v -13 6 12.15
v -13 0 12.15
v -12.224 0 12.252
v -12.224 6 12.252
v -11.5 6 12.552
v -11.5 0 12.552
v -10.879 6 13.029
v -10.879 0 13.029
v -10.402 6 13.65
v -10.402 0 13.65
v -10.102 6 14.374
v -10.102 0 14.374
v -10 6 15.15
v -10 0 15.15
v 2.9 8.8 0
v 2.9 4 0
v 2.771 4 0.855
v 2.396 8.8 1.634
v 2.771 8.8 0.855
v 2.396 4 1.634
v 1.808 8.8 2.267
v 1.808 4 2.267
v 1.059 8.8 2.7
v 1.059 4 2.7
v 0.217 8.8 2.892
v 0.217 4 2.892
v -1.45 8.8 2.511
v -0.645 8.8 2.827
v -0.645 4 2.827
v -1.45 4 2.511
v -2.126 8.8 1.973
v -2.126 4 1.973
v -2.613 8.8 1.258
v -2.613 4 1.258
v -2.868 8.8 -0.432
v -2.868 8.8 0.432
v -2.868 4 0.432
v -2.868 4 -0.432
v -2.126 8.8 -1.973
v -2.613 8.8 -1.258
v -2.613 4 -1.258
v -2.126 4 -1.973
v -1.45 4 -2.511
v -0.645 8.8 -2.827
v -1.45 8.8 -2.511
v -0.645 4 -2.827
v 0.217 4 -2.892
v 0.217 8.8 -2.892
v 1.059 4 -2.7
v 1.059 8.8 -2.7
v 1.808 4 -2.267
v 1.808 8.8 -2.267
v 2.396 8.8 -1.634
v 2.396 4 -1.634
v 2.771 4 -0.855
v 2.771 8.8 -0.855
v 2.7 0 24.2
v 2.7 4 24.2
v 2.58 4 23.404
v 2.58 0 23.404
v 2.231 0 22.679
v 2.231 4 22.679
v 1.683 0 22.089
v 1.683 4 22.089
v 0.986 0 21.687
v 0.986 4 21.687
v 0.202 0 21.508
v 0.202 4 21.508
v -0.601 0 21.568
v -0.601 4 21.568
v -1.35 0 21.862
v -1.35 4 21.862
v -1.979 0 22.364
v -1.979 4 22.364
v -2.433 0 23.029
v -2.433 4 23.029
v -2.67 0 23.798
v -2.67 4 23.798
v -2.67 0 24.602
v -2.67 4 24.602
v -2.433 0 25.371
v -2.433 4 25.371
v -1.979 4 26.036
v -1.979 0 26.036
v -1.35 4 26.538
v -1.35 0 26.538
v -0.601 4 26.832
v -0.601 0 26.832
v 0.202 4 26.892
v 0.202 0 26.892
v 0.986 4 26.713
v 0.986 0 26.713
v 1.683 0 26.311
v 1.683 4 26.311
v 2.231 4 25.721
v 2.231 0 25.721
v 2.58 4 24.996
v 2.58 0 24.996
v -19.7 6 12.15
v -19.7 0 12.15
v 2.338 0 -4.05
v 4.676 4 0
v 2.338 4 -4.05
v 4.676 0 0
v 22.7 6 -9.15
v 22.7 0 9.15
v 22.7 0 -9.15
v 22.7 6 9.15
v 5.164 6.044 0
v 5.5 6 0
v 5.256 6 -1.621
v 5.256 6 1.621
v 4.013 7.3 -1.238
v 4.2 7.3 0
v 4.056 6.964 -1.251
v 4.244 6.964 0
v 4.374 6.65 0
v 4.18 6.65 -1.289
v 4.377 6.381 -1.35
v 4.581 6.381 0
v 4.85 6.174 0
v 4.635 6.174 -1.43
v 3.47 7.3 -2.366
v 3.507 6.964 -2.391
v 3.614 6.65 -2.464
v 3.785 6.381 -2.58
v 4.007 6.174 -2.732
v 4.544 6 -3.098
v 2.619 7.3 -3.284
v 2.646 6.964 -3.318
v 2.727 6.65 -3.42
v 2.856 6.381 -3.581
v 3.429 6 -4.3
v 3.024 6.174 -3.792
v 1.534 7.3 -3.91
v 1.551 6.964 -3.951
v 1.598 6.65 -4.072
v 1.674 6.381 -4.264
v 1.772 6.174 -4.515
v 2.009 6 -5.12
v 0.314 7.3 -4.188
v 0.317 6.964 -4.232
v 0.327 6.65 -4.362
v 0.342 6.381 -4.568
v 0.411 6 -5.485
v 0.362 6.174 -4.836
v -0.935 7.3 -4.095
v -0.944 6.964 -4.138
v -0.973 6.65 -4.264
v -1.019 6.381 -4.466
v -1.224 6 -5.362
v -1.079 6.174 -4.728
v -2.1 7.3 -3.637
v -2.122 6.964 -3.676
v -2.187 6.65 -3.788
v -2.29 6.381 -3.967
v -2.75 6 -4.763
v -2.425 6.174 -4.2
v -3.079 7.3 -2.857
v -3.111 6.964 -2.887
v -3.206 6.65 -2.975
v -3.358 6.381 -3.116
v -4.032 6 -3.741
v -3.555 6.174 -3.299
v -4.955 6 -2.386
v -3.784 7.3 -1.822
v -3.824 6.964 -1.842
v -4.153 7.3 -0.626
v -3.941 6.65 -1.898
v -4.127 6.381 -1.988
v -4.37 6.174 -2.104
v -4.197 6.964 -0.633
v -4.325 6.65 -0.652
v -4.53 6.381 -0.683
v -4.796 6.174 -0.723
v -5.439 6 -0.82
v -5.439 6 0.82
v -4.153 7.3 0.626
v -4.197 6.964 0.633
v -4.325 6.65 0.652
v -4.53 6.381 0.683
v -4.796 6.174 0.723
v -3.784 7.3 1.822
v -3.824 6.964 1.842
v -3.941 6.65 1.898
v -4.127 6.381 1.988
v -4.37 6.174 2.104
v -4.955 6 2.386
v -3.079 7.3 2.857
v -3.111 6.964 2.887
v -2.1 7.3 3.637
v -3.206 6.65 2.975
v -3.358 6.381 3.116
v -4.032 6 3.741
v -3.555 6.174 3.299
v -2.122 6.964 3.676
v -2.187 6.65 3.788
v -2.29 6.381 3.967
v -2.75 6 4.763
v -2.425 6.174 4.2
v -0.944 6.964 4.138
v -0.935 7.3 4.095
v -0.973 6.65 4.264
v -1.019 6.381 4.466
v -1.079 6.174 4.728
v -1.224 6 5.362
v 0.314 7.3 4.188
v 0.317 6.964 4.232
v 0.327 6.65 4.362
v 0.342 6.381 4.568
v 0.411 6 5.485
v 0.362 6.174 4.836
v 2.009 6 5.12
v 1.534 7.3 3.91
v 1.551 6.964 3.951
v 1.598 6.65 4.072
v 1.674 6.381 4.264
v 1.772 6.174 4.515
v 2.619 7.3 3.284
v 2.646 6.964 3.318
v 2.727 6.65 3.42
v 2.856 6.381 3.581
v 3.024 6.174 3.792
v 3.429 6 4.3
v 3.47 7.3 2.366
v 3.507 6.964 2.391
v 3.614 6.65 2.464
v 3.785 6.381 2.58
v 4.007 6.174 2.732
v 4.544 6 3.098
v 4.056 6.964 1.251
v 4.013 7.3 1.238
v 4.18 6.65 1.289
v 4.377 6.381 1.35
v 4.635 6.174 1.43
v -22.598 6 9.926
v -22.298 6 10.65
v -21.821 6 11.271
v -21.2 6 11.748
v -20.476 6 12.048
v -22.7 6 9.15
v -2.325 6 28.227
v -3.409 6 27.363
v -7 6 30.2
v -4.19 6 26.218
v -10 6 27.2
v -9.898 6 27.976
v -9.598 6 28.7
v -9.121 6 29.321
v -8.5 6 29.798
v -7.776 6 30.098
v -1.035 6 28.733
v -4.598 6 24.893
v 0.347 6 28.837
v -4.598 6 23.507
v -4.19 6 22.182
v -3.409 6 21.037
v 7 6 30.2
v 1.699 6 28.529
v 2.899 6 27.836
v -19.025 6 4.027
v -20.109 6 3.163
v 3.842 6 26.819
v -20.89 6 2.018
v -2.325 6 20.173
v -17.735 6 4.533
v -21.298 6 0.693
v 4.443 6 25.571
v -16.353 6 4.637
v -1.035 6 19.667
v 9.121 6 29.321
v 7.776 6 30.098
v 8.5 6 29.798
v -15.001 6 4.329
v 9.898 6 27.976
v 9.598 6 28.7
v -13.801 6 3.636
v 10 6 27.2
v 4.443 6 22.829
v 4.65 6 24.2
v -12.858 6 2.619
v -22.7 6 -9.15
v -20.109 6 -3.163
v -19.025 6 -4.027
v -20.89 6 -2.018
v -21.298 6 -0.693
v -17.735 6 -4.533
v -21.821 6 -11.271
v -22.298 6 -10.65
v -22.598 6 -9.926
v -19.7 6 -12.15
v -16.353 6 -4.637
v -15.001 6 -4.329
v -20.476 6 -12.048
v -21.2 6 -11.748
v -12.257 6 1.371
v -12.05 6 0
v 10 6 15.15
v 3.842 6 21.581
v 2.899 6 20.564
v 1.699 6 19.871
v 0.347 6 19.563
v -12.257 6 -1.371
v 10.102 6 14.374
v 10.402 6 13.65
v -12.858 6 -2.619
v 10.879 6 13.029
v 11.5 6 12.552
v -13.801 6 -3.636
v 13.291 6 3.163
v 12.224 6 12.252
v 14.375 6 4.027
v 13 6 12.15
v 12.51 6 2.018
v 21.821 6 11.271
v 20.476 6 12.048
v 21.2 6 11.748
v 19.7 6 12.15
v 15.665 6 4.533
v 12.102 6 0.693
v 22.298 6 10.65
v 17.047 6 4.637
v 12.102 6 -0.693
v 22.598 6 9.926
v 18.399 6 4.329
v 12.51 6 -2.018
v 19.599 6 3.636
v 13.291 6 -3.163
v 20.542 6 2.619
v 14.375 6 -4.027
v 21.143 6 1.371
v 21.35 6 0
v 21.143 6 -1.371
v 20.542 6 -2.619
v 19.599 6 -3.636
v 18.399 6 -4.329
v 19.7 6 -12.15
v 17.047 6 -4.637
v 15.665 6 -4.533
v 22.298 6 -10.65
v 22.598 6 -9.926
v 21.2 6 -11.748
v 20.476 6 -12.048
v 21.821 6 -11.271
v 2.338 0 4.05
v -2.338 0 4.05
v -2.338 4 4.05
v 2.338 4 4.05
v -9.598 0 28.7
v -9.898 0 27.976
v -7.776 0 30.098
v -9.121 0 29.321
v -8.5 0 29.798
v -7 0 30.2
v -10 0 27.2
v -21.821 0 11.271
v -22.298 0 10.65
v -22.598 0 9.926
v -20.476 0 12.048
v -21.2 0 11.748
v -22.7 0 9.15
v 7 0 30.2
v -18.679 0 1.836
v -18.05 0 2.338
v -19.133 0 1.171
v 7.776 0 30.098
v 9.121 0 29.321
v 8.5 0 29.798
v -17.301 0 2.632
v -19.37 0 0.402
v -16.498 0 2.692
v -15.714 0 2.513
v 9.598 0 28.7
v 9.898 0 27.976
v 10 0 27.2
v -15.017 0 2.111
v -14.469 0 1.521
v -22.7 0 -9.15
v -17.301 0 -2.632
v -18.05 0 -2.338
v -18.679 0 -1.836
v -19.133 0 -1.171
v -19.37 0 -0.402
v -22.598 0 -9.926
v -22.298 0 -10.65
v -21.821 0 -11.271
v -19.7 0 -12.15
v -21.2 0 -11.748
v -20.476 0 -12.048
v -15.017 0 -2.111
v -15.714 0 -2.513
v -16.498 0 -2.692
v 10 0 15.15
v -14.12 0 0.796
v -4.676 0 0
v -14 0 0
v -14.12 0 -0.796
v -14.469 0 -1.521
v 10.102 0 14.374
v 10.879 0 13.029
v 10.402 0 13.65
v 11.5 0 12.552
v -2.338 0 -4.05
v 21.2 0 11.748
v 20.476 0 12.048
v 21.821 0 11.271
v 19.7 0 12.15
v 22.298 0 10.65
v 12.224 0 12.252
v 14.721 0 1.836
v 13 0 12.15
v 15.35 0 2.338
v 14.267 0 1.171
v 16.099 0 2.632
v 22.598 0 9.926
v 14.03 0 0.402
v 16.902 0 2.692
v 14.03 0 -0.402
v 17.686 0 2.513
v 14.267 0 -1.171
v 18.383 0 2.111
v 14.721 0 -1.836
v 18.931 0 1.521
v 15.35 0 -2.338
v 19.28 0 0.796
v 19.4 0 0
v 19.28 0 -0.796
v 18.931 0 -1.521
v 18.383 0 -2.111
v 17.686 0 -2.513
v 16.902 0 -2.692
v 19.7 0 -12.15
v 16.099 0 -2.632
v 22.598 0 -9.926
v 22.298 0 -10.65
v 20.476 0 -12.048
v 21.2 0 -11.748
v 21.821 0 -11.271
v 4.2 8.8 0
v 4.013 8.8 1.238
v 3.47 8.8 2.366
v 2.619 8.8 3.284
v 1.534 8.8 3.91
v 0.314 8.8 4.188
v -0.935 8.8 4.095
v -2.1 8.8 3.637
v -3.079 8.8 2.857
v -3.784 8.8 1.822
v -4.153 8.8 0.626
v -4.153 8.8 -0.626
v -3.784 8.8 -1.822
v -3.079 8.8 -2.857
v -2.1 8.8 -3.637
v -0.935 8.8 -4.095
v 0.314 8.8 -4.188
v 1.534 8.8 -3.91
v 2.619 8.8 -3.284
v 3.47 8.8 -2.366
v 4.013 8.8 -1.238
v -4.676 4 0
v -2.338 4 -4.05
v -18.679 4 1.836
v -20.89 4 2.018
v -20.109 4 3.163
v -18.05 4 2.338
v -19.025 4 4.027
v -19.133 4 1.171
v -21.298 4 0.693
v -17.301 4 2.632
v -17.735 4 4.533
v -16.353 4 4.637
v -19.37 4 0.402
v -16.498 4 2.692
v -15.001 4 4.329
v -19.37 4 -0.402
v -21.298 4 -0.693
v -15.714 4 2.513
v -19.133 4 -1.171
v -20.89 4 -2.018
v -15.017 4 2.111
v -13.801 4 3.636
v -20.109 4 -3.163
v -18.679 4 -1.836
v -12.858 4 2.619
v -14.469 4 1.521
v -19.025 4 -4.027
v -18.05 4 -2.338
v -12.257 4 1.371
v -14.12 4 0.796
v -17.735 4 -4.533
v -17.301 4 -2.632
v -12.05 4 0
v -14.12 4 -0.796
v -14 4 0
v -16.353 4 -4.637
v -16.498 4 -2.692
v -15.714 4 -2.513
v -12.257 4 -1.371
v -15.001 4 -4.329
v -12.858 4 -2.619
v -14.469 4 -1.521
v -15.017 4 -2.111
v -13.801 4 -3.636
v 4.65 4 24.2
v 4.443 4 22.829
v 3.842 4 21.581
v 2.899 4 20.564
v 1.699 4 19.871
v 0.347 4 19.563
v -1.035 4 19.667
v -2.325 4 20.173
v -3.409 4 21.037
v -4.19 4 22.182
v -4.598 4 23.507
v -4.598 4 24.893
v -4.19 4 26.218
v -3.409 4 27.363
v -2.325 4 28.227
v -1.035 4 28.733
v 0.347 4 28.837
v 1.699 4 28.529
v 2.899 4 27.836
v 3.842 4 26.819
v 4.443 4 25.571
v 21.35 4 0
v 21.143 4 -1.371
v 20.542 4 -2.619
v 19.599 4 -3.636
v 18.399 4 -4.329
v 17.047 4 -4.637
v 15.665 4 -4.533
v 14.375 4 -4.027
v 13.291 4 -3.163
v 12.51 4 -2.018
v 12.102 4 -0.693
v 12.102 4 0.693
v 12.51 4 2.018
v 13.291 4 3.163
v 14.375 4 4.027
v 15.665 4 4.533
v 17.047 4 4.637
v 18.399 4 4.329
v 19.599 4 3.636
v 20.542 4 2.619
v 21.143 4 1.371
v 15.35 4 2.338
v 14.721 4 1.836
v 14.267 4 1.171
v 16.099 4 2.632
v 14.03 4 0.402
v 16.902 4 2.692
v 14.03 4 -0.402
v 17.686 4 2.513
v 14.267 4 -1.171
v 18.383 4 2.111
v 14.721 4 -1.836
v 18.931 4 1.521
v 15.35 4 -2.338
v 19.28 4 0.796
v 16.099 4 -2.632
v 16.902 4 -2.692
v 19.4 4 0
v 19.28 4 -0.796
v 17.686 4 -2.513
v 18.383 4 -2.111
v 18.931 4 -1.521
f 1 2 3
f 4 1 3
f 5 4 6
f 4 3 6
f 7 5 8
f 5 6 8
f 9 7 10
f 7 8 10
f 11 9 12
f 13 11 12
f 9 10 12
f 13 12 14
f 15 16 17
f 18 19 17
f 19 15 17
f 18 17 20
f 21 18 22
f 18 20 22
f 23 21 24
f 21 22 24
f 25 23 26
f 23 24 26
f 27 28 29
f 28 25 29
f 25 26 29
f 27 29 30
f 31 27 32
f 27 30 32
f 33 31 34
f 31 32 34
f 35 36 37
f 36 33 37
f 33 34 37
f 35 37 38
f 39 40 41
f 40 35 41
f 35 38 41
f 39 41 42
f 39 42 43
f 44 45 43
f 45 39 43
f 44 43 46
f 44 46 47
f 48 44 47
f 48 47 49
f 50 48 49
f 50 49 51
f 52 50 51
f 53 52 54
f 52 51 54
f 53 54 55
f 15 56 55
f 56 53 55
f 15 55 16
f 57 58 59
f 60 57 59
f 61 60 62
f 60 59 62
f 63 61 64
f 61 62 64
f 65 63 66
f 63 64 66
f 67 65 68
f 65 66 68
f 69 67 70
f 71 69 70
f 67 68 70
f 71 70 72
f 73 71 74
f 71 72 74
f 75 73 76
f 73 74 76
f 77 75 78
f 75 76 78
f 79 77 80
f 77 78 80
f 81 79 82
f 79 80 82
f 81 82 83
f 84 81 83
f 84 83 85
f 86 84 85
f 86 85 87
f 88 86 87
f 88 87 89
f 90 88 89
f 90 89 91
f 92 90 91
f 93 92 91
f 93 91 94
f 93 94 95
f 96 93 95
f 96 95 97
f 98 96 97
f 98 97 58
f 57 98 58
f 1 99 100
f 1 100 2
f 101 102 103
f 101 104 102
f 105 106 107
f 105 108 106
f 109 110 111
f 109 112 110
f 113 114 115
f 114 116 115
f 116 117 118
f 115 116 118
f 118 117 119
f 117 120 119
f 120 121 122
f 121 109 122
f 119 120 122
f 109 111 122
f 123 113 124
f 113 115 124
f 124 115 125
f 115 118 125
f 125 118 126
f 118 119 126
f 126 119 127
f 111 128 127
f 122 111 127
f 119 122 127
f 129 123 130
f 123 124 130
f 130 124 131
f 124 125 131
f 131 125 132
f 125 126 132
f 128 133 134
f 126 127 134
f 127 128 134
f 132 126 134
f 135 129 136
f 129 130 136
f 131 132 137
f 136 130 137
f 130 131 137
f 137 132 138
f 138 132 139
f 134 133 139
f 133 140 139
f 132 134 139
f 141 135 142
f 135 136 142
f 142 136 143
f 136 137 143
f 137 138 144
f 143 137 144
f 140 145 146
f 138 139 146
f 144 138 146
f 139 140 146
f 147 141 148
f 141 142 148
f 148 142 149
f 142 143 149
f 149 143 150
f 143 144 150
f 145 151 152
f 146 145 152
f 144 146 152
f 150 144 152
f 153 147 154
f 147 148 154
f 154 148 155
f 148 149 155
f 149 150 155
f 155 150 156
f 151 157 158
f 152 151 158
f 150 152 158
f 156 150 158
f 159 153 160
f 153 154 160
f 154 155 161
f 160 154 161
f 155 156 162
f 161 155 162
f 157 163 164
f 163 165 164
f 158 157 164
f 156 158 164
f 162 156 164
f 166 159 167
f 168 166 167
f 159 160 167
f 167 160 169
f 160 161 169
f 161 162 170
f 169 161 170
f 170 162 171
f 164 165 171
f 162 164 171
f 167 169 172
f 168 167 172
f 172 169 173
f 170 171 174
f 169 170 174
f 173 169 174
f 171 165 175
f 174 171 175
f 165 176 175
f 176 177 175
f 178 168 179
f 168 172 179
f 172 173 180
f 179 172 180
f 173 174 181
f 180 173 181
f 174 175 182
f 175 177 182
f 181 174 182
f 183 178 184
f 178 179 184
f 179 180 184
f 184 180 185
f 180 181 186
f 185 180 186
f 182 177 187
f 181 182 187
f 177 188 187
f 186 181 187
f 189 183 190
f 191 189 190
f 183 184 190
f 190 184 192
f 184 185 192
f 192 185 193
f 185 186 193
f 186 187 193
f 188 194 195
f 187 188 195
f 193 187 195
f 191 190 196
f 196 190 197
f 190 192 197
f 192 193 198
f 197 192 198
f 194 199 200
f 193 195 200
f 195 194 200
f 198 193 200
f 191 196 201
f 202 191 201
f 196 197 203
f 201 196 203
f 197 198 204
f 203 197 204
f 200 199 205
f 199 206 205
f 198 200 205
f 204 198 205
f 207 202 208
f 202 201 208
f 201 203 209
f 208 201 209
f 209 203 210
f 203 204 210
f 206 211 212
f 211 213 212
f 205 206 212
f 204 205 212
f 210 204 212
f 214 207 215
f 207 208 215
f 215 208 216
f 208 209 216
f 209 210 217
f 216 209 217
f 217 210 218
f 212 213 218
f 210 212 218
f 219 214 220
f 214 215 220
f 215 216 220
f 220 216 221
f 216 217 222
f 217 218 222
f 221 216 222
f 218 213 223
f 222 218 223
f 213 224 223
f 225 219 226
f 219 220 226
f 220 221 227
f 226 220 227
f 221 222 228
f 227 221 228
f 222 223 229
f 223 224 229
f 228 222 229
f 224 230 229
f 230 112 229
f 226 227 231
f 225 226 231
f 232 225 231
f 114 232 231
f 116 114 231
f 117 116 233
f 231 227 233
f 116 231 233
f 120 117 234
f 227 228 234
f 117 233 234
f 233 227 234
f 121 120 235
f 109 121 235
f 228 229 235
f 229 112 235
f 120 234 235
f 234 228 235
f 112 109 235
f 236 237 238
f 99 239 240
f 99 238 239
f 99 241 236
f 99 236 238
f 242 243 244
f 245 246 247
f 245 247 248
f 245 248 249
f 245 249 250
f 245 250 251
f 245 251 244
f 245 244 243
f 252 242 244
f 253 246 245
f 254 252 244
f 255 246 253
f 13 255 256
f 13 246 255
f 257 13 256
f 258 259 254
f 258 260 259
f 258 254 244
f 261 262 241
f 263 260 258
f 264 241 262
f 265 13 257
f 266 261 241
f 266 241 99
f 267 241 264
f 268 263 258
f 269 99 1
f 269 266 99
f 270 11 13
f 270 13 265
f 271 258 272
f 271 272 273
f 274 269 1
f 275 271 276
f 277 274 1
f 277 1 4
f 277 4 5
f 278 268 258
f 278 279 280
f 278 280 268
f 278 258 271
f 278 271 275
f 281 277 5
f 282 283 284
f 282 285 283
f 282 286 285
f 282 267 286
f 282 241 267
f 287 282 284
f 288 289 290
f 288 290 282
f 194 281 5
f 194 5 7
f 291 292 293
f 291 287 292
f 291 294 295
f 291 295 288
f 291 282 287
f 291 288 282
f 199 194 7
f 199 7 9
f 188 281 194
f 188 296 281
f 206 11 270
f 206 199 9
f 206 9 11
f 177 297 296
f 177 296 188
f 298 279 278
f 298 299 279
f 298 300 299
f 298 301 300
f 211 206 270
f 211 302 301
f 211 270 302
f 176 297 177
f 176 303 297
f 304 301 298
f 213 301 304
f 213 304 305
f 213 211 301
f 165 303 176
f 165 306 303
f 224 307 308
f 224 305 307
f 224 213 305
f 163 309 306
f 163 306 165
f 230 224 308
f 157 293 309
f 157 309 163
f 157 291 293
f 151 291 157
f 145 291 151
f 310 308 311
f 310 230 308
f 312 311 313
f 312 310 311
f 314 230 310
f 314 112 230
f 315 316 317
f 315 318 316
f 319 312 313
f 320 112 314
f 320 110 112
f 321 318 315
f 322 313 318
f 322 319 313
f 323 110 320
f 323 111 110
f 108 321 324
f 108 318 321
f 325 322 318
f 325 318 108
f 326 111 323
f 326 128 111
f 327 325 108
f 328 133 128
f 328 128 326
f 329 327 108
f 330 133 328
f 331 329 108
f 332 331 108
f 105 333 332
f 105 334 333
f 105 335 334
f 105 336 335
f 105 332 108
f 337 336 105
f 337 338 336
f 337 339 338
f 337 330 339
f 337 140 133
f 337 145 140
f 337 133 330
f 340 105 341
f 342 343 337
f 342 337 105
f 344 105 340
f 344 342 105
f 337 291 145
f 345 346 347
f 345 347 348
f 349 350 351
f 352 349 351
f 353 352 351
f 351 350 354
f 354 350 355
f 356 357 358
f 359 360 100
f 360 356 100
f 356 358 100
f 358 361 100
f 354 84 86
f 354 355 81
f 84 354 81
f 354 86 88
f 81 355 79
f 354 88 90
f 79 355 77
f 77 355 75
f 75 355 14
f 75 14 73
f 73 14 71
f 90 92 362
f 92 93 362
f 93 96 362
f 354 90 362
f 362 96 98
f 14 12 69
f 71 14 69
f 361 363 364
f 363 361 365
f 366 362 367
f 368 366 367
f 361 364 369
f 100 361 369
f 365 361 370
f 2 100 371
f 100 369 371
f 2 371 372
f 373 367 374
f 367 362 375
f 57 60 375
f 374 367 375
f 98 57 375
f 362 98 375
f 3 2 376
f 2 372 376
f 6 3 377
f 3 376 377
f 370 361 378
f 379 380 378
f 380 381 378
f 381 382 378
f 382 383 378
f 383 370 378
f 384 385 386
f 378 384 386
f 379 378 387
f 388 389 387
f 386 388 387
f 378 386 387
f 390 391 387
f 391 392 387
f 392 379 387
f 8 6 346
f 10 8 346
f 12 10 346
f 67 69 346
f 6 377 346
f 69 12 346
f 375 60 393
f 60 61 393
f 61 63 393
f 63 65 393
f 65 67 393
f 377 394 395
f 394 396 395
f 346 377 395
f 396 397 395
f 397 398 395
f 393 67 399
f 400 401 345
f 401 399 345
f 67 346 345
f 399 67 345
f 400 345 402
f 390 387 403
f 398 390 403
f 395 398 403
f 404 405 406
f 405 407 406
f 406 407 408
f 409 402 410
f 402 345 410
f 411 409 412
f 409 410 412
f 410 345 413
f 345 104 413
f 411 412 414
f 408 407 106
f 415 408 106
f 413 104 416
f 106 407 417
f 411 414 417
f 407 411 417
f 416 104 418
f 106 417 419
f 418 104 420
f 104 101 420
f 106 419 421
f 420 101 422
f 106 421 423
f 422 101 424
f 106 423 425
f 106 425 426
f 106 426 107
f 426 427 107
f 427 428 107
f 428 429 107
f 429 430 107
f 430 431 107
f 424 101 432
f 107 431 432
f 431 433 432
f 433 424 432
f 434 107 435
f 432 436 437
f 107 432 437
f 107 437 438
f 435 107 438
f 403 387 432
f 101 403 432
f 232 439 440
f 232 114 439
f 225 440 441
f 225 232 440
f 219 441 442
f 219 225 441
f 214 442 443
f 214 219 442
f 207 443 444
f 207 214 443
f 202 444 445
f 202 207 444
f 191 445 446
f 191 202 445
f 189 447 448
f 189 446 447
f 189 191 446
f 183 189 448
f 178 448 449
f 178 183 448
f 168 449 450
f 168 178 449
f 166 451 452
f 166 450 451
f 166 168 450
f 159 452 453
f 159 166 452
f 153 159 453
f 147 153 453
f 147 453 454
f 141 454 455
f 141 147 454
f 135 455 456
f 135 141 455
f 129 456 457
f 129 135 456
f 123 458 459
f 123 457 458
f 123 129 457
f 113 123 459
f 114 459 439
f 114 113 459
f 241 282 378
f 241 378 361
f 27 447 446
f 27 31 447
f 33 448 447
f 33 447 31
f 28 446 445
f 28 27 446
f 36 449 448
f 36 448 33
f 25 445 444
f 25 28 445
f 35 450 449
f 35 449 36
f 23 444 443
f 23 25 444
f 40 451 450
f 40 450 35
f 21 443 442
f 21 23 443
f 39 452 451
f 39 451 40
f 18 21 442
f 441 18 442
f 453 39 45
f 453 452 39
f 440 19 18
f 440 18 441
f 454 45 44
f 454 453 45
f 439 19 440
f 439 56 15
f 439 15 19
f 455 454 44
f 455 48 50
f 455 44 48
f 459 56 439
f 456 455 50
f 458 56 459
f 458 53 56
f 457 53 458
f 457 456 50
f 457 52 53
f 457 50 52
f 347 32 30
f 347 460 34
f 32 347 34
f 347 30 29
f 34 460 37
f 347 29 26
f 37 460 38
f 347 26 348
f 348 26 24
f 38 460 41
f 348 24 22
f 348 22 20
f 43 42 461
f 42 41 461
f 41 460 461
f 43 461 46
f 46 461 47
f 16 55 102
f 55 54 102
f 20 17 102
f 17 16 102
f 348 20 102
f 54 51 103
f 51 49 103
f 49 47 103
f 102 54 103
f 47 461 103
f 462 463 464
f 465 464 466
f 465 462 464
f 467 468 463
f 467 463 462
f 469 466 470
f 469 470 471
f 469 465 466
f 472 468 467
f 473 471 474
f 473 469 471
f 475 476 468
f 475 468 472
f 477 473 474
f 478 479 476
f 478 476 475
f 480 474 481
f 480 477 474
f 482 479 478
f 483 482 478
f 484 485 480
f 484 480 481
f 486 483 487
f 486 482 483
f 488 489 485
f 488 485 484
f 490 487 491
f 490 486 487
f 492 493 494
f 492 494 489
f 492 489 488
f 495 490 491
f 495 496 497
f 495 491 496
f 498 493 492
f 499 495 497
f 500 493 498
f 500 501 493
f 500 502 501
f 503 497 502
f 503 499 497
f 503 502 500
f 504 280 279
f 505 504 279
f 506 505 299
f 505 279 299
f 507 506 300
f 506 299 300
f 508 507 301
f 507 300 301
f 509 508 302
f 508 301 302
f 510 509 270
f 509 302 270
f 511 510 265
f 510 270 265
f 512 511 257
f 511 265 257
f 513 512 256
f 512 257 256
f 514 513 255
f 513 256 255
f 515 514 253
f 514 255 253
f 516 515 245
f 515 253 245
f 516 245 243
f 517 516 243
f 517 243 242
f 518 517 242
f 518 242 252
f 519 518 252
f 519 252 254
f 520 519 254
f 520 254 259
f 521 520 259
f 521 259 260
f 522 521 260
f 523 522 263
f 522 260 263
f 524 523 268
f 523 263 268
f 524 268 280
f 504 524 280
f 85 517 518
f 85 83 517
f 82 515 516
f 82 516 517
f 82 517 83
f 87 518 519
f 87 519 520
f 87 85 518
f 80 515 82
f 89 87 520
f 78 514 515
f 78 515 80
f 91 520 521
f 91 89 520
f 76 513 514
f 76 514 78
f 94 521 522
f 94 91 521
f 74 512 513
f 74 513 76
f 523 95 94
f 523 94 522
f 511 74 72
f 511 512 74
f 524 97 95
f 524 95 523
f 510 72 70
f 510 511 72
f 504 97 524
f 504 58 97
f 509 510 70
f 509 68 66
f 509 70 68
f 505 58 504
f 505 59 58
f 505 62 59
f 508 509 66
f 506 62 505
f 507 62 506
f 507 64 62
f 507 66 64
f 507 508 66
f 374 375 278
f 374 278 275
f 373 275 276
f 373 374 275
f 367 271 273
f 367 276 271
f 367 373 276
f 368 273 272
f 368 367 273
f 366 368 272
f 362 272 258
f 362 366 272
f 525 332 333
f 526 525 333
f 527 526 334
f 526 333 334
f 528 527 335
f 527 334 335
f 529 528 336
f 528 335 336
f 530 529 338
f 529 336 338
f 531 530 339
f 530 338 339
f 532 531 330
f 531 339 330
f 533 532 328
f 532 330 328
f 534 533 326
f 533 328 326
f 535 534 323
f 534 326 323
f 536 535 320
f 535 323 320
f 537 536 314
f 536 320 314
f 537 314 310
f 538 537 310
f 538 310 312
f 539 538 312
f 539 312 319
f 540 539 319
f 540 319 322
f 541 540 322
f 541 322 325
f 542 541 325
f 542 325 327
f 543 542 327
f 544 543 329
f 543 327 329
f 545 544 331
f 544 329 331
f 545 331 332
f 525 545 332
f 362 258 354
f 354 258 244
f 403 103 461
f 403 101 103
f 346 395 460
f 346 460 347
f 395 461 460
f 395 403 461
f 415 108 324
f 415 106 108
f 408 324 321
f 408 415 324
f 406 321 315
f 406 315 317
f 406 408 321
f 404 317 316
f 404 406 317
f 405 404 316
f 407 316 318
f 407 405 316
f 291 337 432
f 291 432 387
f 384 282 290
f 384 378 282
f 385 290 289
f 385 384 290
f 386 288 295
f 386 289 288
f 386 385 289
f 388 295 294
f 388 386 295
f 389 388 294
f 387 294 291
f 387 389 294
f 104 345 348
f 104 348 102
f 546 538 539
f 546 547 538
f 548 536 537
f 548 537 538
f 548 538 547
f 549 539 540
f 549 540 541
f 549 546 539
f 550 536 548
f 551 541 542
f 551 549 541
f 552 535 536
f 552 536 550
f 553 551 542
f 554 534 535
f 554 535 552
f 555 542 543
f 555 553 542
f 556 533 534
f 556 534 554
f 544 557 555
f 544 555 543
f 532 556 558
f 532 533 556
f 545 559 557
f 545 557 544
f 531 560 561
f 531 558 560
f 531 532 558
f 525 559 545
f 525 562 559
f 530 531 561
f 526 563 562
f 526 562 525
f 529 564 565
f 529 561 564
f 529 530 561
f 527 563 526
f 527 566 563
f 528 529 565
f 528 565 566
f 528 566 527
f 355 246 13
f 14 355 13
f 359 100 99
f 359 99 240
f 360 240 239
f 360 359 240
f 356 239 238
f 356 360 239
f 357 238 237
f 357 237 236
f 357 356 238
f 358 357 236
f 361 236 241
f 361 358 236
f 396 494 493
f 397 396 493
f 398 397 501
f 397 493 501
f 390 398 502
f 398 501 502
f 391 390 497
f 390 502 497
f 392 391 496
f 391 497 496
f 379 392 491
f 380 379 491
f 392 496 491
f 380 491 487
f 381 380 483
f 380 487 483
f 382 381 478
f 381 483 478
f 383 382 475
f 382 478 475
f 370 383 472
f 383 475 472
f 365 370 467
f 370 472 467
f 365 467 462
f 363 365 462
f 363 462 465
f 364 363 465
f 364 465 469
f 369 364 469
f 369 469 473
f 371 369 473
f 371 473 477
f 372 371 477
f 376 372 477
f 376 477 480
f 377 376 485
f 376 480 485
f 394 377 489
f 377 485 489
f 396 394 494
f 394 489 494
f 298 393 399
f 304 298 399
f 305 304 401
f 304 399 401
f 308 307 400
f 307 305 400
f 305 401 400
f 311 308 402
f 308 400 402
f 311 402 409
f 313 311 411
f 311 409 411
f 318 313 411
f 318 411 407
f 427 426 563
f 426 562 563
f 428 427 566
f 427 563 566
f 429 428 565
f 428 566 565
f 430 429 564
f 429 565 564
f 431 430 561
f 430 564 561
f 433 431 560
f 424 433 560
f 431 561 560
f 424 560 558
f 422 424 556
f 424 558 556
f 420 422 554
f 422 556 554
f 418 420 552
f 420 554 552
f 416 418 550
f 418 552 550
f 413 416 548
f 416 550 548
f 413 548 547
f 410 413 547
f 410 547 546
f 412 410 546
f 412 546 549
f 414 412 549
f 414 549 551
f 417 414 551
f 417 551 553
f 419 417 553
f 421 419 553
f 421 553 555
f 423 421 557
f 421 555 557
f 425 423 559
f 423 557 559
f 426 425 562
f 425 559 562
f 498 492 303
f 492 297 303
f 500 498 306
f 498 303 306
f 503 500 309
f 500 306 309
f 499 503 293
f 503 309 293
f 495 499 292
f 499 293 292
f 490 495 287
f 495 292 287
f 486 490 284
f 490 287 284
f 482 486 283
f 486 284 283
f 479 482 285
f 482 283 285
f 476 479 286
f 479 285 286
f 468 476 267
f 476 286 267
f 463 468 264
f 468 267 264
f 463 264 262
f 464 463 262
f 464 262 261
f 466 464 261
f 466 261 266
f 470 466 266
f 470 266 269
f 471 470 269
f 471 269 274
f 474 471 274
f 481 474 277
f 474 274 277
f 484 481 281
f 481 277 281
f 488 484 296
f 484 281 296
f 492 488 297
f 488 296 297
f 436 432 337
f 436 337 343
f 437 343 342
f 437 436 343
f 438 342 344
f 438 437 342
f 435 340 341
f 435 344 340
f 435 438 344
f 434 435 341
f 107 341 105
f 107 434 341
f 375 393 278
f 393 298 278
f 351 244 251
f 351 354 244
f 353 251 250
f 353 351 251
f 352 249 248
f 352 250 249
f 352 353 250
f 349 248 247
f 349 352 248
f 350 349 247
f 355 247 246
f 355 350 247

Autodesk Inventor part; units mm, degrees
ref_plane "YZ Plane" through (0, 0, 0) normal (1, 0, 0) x (0, 1, 0)
ref_plane "XZ Plane" through (0, 0, 0) normal (0, 1, 0) x (-1, 0, 0)
ref_plane "XY Plane" through (0, 0, 0) normal (0, 0, 1) x (1, 0, 0)
sketch "Boceto1" plane through (0, 0, 0) normal (0, 1, 0) x (-1, 0, 0)
  circle A0 centre (0, 0) radius 12.15
  dimension "d0" = 24.3
extrude "Extrusión1" add sketch "Boceto1" along normal blind 4
sketch "Boceto2" plane through (0, 0, 0) normal (0, -1, 0) x (1, 0, 0)
  line L0 (4.6765, 0) -> (2.3383, -4.05)
  line L1 (2.3383, -4.05) -> (-2.3383, -4.05)
  line L2 (-2.3383, -4.05) -> (-4.6765, 0)
  line L3 (-4.6765, 0) -> (-2.3383, 4.05)
  line L4 (-2.3383, 4.05) -> (2.3383, 4.05)
  line L5 (2.3383, 4.05) -> (4.6765, 0)
  circle A0 centre (0, 0) radius 4.05
  dimension "d3" = 8.1
extrude "Extrusión2" cut sketch "Boceto2" against normal blind 4
sketch "Boceto3" plane through (0, 4, 0) normal (0, 1, 0) x (1, 0, 0)
  line L0 (2.3383, 4.05) -> (4.6765, 0) projected
  line L1 (4.6765, 0) -> (2.3383, -4.05) projected
  line L2 (2.3383, -4.05) -> (-2.3383, -4.05) projected
  line L3 (-2.3383, -4.05) -> (-4.6765, 0) projected
  line L4 (-4.6765, 0) -> (-2.3383, 4.05) projected
  line L5 (-2.3383, 4.05) -> (2.3383, 4.05) projected
  circle A0 centre (0, 0) radius 12.15 projected
  circle A1 centre (0, 0) radius 2.9
  dimension "d6" = 5.8
extrude "Extrusión3" add sketch "Boceto3" along normal blind 2 contours L0 L1 L2 L3 L4 L5 | A0
sketch "Boceto4" plane through (0, 6, 0) normal (0, 1, 0) x (1, 0, 0)
  circle A0 centre (0, 0) radius 4.2
  circle A1 centre (0, 0) radius 2.9 projected
  dimension "d9" = 8.4
extrude "Extrusión4" add sketch "Boceto4" along normal blind 2.8
fillet "Empalme1" radius 1.3 1 edges at (-4.2, 6, 0)
sketch "Boceto5" plane through (0, 6, 0) normal (0, 1, 0) x (1, 0, 0)
  line L0 (-22.7, -12.15) -> (22.7, -12.15)
  line L1 (22.7, -12.15) -> (22.7, 12.15)
  line L2 (22.7, 12.15) -> (-22.7, 12.15)
  line L3 (-22.7, 12.15) -> (-22.7, -12.15)
  circle A0 centre (0, 0) radius 2.9 projected
  line L4 (-22.7, -12.15) -> (22.7, 12.15) construction
  line L5 (22.7, -12.15) -> (-22.7, 12.15) construction
  circle A1 centre (0, 0) radius 12.15 projected
  point P0 (0, -12.15)
  point P1 (0, 12.15)
  dimension "d13" = 45.4
extrude "Extrusión5" add sketch "Boceto5" against normal up to surface (6 mm away) contours L3 L2 A1 L0 | A1 L2 L1 L0
sketch "Boceto6" plane through (0, 6, 0) normal (0, 1, 0) x (1, 0, 0)
  circle A0 centre (-16.7, 0) radius 2.7
  circle A1 centre (16.7, 0) radius 2.7
  line L0 (-22.7, 12.15) -> (-22.7, -12.15) projected
  line L1 (22.7, -12.15) -> (22.7, 12.15) projected
  point P0 (0, 0)
  dimension "d16" = 5.4
  dimension "d17" = 6
  dimension "d18" = 6
extrude "Extrusión6" cut sketch "Boceto6" against normal through all
fillet "Empalme2" radius 3 4 edges at (-22.7, 3, 12.15) (22.7, 3, 12.15) (-22.7, 3, -12.15) (22.7, 3, -12.15)
sketch "Boceto7" plane through (0, 6, 0) normal (0, 1, 0) x (1, 0, 0)
  line L0 (-10, 30.2) -> (10, 30.2)
  line L1 (10, 30.2) -> (10, -30.2)
  line L2 (10, -30.2) -> (-10, -30.2)
  line L3 (-10, -30.2) -> (-10, 30.2)
  line L4 (-10, 30.2) -> (10, -30.2) construction
  line L5 (10, 30.2) -> (-10, -30.2) construction
  line L6 (-19.7, -12.15) -> (19.7, -12.15) projected
  circle A0 centre (0, -24.2) radius 2.7
  circle A1 centre (0, 0) radius 21.5
  point P0 (10, -12.15)
  point P1 (-10, -12.15)
  dimension "d22" = 20
  dimension "d24" = 5.4
  dimension "d25" = 6
  dimension "d29" = 43
extrude "Extrusión7" add sketch "Boceto7" against normal up to surface (6 mm away) contours L6 L1 A1 L3 | A1 L1 L2 L3 picked at (0, -15.2667)
fillet "Empalme3" radius 3 4 edges at (-10, 3, 12.15) (-10, 3, 30.2) (10, 3, 30.2) (10, 3, 12.15)
sketch "Boceto9" plane through (0, 6, 0) normal (0, 1, 0) x (1, 0, 0)
  circle A0 centre (16.7, 0) radius 2.7 projected
  circle A1 centre (16.7, 0) radius 4.65
  circle A2 centre (-16.7, 0) radius 2.7 projected
  circle A3 centre (-16.7, 0) radius 4.65
  circle A4 centre (0, -24.2) radius 2.7 projected
  circle A5 centre (0, -24.2) radius 4.65
  point P0 (0, 0)
  dimension "d30" = 9.3
extrude "Extrusión8" cut sketch "Boceto9" against normal blind 2 contours A0 | A1 | A2 | A3 | A4 | A5
sketch "Boceto10" plane through (0, 6, 0) normal (0, 1, 0) x (1, 0, 0)
  circle A0 centre (0, 0) radius 2.9 projected
  circle A1 centre (0, 0) radius 12
  dimension "d33" = 24
properties part number "Pulley support"
